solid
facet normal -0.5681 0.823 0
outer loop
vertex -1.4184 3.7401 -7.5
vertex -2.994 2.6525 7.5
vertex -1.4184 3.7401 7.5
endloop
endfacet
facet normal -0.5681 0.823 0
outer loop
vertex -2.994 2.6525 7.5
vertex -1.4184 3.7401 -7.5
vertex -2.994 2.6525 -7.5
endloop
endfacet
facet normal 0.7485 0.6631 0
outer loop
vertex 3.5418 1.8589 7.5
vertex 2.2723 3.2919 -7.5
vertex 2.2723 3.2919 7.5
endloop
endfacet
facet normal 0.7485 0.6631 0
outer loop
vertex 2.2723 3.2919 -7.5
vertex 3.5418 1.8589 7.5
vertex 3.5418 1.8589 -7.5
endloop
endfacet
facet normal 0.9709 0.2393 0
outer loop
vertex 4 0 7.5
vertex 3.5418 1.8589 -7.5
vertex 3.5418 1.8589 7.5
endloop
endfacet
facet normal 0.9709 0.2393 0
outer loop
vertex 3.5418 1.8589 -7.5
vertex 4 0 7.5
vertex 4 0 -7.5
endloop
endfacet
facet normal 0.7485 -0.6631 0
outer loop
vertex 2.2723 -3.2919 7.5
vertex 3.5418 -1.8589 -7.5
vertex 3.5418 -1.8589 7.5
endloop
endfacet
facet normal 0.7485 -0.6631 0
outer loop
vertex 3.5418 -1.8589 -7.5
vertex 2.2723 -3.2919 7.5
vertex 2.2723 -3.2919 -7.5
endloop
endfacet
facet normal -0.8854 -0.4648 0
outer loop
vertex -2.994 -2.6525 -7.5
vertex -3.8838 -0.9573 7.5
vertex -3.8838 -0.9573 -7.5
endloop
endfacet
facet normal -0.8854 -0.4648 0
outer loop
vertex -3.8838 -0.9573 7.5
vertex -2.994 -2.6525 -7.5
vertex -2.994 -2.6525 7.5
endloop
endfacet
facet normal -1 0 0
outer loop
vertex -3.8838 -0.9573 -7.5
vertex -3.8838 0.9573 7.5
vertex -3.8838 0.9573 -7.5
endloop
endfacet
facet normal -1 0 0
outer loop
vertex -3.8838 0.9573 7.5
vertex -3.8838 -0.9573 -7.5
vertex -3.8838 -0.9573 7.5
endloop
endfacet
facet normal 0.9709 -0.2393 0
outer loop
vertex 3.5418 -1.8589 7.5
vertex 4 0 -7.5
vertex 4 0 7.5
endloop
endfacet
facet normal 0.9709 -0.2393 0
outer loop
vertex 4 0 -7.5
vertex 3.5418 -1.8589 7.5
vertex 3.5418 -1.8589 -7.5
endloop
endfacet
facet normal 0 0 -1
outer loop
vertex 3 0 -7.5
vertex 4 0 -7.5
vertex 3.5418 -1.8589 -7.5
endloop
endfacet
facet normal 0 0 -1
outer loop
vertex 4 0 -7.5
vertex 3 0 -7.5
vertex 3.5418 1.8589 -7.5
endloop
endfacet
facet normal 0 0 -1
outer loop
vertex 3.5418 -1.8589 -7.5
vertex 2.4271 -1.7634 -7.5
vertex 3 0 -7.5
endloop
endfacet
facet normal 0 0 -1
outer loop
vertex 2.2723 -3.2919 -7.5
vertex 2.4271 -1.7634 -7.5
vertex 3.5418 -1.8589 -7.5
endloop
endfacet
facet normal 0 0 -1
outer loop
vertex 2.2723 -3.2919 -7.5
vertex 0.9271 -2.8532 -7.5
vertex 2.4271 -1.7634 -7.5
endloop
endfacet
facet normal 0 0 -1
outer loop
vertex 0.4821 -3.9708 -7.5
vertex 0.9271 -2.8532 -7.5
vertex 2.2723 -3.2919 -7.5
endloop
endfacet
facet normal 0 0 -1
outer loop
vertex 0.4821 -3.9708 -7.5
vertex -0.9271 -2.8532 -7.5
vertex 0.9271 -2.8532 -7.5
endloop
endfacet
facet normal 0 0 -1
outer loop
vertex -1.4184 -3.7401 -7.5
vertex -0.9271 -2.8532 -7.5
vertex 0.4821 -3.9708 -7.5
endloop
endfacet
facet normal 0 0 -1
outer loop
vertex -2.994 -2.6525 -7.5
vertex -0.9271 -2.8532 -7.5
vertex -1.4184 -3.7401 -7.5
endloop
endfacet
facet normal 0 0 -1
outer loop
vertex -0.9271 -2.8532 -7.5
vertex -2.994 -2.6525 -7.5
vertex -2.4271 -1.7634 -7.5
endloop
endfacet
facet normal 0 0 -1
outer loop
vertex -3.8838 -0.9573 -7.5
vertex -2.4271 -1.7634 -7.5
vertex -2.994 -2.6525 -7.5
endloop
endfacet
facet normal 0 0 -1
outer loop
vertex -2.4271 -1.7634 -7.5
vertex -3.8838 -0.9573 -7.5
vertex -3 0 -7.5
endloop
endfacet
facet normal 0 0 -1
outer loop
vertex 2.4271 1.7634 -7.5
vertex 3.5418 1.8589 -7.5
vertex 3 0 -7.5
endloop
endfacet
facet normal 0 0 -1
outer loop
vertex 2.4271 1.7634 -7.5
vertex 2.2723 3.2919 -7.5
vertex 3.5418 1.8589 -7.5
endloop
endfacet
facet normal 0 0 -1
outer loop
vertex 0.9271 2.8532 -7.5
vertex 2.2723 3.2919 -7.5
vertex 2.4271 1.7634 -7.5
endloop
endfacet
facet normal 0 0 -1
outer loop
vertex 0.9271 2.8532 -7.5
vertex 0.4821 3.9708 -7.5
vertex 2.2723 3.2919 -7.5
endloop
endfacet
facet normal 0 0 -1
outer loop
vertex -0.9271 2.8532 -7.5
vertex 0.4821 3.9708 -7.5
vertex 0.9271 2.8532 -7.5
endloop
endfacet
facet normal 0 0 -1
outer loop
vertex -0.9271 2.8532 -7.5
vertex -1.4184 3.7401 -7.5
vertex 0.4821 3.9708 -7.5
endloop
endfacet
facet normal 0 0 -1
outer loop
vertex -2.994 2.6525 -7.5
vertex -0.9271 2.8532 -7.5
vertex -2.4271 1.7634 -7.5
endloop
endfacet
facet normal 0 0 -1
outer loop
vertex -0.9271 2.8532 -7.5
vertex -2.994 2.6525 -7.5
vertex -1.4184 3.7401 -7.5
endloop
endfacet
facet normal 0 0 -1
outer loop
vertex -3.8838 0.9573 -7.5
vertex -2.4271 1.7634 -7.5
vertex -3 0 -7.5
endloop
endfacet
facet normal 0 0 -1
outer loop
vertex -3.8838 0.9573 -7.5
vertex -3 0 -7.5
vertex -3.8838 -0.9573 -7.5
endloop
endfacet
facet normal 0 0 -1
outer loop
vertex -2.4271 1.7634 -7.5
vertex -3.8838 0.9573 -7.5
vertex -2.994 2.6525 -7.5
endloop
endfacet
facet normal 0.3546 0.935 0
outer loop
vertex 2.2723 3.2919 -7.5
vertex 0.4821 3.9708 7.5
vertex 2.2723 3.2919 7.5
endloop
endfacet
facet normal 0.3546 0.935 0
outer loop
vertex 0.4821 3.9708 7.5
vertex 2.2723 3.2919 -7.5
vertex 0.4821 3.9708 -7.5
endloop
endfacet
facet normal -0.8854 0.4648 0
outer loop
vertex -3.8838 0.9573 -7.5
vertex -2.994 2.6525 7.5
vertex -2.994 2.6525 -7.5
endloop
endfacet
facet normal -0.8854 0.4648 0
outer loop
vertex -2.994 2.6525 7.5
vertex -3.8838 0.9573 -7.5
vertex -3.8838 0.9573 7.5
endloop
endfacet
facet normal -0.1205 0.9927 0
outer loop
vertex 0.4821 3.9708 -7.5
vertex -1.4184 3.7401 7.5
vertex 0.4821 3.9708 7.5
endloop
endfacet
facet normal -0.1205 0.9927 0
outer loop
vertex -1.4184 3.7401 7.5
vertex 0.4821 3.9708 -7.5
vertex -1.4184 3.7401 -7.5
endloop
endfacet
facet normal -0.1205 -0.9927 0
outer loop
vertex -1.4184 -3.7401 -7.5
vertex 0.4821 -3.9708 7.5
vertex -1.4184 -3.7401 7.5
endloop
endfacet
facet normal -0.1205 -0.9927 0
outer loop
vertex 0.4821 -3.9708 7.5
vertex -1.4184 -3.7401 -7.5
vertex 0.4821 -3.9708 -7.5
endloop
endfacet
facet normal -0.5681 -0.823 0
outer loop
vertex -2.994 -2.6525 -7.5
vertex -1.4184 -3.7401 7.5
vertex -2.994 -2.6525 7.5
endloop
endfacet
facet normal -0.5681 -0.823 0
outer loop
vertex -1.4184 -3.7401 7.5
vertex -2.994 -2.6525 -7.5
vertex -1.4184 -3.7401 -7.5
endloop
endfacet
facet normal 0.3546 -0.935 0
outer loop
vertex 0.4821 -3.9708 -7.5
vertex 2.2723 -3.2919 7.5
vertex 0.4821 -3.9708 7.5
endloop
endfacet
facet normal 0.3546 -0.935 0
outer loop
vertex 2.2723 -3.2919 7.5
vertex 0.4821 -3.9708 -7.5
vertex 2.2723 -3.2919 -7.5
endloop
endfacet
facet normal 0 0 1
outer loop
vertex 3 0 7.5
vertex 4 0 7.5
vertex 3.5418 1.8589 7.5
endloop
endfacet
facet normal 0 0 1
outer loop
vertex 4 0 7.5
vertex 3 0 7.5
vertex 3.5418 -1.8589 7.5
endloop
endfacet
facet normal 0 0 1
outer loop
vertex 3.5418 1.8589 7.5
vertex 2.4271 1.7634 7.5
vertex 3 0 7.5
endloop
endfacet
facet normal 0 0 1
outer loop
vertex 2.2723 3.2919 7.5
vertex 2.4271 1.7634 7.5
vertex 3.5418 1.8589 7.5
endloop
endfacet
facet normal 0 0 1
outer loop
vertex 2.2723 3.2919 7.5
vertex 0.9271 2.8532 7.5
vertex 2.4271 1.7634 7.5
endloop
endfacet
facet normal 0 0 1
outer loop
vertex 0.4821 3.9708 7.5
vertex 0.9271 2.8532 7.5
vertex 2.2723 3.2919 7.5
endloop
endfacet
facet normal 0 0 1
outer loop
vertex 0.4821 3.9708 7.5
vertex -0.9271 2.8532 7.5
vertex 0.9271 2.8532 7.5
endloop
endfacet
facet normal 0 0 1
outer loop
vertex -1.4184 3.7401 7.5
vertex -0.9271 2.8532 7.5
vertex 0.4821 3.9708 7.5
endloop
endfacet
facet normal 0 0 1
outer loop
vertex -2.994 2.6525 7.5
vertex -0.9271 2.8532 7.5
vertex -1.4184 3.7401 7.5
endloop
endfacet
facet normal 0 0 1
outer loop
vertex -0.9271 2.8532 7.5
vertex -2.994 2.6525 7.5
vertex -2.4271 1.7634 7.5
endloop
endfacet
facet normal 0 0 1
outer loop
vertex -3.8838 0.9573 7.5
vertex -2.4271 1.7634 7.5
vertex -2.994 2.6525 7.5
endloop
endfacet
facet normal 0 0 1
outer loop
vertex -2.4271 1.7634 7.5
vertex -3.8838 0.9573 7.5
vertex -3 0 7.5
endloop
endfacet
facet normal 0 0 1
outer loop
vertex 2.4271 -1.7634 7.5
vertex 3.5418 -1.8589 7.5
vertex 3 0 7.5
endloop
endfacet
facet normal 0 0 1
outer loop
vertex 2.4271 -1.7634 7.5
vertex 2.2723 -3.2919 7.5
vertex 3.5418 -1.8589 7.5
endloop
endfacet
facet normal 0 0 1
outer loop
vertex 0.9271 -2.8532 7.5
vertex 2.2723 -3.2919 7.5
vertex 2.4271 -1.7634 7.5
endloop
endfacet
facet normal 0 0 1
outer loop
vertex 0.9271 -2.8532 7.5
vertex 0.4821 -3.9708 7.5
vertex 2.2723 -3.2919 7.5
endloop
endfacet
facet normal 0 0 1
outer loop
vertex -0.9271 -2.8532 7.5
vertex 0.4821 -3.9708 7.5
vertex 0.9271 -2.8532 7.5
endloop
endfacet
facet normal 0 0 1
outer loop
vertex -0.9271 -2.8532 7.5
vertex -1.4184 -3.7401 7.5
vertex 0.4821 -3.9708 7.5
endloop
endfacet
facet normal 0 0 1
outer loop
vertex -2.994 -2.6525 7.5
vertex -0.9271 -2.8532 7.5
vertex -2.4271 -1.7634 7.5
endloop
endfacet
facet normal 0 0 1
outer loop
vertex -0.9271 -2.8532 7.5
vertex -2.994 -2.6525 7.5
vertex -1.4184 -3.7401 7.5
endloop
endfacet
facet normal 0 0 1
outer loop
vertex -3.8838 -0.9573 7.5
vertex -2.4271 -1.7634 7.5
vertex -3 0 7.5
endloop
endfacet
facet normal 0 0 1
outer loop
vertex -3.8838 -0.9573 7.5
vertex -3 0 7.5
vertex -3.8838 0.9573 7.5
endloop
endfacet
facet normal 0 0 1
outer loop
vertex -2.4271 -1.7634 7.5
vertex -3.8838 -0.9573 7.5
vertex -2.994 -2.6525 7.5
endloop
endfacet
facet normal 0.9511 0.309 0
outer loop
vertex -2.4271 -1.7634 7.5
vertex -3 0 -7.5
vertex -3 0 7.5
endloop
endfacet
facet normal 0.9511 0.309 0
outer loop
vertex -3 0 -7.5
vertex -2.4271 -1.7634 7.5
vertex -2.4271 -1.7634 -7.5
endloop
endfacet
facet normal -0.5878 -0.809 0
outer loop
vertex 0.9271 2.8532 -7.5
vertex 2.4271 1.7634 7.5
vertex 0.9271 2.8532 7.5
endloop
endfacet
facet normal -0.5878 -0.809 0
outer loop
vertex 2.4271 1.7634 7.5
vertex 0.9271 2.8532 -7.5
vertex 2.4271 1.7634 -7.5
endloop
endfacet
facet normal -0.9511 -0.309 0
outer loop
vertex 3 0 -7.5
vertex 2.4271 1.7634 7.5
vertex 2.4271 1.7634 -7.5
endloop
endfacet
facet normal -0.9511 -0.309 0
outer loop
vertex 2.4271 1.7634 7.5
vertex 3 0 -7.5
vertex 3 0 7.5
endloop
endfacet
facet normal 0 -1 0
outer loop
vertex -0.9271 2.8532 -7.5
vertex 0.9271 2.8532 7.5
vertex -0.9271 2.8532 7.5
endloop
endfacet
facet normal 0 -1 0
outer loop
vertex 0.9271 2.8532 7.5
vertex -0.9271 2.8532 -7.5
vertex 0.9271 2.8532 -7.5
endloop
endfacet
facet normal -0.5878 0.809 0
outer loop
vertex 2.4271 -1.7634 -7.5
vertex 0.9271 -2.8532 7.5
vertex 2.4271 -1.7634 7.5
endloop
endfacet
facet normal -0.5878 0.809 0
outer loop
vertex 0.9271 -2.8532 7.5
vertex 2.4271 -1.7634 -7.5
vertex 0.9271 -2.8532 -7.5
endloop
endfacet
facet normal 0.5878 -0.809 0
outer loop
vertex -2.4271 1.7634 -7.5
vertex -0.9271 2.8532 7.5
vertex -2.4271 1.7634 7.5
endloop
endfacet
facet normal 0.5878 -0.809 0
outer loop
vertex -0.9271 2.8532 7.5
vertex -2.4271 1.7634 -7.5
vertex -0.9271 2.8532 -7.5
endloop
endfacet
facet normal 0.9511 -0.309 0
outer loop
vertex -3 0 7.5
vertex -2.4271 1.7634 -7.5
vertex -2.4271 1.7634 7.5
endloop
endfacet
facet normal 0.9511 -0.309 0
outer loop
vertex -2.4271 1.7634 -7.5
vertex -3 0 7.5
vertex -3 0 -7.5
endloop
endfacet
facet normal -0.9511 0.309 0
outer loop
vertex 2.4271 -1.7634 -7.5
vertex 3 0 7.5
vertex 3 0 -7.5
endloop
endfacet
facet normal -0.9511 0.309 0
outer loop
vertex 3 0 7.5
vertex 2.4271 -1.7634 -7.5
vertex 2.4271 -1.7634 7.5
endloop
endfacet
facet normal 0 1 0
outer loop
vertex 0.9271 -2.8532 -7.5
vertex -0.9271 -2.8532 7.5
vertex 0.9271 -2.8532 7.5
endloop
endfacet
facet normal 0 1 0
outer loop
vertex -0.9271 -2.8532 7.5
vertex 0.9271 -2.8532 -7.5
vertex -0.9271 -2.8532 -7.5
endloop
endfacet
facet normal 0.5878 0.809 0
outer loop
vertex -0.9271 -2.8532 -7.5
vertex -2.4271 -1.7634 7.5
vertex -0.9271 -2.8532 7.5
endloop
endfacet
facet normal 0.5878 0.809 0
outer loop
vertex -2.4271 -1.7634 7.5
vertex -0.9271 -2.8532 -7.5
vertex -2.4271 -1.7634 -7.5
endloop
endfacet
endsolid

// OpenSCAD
// Parameters
material = 1; //[1:1:1]
length = 15; //[8:30:1]
center = 1; //[0:1:1]
forced_id = 0; //[0:20:0.1]
path = 0; //[0:0:1]
library_od = 8; //[4:16:0.1]
library_id = 6; //[2:14:0.1]
eps_overlap = 0.5; //[0.2:2:0.1]

// Tubing - complete geometry
module tubing() {
  color([0.1, 0.1, 0.1]) { // Carbon fiber color
    difference() {
      // Outer cylinder
      cylinder(
        h = length,
        r = (library_od + (forced_id > 0 ? (forced_id - library_id) : 0)) / 2,
        center = true
      );
      // Inner void
      cylinder(
        h = length + 2 * eps_overlap,
        r = (forced_id > 0 ? forced_id : library_id) / 2,
        center = true
      );
    }
  }
}

// Assembly
module assembly() {
  tubing();
}

assembly();
